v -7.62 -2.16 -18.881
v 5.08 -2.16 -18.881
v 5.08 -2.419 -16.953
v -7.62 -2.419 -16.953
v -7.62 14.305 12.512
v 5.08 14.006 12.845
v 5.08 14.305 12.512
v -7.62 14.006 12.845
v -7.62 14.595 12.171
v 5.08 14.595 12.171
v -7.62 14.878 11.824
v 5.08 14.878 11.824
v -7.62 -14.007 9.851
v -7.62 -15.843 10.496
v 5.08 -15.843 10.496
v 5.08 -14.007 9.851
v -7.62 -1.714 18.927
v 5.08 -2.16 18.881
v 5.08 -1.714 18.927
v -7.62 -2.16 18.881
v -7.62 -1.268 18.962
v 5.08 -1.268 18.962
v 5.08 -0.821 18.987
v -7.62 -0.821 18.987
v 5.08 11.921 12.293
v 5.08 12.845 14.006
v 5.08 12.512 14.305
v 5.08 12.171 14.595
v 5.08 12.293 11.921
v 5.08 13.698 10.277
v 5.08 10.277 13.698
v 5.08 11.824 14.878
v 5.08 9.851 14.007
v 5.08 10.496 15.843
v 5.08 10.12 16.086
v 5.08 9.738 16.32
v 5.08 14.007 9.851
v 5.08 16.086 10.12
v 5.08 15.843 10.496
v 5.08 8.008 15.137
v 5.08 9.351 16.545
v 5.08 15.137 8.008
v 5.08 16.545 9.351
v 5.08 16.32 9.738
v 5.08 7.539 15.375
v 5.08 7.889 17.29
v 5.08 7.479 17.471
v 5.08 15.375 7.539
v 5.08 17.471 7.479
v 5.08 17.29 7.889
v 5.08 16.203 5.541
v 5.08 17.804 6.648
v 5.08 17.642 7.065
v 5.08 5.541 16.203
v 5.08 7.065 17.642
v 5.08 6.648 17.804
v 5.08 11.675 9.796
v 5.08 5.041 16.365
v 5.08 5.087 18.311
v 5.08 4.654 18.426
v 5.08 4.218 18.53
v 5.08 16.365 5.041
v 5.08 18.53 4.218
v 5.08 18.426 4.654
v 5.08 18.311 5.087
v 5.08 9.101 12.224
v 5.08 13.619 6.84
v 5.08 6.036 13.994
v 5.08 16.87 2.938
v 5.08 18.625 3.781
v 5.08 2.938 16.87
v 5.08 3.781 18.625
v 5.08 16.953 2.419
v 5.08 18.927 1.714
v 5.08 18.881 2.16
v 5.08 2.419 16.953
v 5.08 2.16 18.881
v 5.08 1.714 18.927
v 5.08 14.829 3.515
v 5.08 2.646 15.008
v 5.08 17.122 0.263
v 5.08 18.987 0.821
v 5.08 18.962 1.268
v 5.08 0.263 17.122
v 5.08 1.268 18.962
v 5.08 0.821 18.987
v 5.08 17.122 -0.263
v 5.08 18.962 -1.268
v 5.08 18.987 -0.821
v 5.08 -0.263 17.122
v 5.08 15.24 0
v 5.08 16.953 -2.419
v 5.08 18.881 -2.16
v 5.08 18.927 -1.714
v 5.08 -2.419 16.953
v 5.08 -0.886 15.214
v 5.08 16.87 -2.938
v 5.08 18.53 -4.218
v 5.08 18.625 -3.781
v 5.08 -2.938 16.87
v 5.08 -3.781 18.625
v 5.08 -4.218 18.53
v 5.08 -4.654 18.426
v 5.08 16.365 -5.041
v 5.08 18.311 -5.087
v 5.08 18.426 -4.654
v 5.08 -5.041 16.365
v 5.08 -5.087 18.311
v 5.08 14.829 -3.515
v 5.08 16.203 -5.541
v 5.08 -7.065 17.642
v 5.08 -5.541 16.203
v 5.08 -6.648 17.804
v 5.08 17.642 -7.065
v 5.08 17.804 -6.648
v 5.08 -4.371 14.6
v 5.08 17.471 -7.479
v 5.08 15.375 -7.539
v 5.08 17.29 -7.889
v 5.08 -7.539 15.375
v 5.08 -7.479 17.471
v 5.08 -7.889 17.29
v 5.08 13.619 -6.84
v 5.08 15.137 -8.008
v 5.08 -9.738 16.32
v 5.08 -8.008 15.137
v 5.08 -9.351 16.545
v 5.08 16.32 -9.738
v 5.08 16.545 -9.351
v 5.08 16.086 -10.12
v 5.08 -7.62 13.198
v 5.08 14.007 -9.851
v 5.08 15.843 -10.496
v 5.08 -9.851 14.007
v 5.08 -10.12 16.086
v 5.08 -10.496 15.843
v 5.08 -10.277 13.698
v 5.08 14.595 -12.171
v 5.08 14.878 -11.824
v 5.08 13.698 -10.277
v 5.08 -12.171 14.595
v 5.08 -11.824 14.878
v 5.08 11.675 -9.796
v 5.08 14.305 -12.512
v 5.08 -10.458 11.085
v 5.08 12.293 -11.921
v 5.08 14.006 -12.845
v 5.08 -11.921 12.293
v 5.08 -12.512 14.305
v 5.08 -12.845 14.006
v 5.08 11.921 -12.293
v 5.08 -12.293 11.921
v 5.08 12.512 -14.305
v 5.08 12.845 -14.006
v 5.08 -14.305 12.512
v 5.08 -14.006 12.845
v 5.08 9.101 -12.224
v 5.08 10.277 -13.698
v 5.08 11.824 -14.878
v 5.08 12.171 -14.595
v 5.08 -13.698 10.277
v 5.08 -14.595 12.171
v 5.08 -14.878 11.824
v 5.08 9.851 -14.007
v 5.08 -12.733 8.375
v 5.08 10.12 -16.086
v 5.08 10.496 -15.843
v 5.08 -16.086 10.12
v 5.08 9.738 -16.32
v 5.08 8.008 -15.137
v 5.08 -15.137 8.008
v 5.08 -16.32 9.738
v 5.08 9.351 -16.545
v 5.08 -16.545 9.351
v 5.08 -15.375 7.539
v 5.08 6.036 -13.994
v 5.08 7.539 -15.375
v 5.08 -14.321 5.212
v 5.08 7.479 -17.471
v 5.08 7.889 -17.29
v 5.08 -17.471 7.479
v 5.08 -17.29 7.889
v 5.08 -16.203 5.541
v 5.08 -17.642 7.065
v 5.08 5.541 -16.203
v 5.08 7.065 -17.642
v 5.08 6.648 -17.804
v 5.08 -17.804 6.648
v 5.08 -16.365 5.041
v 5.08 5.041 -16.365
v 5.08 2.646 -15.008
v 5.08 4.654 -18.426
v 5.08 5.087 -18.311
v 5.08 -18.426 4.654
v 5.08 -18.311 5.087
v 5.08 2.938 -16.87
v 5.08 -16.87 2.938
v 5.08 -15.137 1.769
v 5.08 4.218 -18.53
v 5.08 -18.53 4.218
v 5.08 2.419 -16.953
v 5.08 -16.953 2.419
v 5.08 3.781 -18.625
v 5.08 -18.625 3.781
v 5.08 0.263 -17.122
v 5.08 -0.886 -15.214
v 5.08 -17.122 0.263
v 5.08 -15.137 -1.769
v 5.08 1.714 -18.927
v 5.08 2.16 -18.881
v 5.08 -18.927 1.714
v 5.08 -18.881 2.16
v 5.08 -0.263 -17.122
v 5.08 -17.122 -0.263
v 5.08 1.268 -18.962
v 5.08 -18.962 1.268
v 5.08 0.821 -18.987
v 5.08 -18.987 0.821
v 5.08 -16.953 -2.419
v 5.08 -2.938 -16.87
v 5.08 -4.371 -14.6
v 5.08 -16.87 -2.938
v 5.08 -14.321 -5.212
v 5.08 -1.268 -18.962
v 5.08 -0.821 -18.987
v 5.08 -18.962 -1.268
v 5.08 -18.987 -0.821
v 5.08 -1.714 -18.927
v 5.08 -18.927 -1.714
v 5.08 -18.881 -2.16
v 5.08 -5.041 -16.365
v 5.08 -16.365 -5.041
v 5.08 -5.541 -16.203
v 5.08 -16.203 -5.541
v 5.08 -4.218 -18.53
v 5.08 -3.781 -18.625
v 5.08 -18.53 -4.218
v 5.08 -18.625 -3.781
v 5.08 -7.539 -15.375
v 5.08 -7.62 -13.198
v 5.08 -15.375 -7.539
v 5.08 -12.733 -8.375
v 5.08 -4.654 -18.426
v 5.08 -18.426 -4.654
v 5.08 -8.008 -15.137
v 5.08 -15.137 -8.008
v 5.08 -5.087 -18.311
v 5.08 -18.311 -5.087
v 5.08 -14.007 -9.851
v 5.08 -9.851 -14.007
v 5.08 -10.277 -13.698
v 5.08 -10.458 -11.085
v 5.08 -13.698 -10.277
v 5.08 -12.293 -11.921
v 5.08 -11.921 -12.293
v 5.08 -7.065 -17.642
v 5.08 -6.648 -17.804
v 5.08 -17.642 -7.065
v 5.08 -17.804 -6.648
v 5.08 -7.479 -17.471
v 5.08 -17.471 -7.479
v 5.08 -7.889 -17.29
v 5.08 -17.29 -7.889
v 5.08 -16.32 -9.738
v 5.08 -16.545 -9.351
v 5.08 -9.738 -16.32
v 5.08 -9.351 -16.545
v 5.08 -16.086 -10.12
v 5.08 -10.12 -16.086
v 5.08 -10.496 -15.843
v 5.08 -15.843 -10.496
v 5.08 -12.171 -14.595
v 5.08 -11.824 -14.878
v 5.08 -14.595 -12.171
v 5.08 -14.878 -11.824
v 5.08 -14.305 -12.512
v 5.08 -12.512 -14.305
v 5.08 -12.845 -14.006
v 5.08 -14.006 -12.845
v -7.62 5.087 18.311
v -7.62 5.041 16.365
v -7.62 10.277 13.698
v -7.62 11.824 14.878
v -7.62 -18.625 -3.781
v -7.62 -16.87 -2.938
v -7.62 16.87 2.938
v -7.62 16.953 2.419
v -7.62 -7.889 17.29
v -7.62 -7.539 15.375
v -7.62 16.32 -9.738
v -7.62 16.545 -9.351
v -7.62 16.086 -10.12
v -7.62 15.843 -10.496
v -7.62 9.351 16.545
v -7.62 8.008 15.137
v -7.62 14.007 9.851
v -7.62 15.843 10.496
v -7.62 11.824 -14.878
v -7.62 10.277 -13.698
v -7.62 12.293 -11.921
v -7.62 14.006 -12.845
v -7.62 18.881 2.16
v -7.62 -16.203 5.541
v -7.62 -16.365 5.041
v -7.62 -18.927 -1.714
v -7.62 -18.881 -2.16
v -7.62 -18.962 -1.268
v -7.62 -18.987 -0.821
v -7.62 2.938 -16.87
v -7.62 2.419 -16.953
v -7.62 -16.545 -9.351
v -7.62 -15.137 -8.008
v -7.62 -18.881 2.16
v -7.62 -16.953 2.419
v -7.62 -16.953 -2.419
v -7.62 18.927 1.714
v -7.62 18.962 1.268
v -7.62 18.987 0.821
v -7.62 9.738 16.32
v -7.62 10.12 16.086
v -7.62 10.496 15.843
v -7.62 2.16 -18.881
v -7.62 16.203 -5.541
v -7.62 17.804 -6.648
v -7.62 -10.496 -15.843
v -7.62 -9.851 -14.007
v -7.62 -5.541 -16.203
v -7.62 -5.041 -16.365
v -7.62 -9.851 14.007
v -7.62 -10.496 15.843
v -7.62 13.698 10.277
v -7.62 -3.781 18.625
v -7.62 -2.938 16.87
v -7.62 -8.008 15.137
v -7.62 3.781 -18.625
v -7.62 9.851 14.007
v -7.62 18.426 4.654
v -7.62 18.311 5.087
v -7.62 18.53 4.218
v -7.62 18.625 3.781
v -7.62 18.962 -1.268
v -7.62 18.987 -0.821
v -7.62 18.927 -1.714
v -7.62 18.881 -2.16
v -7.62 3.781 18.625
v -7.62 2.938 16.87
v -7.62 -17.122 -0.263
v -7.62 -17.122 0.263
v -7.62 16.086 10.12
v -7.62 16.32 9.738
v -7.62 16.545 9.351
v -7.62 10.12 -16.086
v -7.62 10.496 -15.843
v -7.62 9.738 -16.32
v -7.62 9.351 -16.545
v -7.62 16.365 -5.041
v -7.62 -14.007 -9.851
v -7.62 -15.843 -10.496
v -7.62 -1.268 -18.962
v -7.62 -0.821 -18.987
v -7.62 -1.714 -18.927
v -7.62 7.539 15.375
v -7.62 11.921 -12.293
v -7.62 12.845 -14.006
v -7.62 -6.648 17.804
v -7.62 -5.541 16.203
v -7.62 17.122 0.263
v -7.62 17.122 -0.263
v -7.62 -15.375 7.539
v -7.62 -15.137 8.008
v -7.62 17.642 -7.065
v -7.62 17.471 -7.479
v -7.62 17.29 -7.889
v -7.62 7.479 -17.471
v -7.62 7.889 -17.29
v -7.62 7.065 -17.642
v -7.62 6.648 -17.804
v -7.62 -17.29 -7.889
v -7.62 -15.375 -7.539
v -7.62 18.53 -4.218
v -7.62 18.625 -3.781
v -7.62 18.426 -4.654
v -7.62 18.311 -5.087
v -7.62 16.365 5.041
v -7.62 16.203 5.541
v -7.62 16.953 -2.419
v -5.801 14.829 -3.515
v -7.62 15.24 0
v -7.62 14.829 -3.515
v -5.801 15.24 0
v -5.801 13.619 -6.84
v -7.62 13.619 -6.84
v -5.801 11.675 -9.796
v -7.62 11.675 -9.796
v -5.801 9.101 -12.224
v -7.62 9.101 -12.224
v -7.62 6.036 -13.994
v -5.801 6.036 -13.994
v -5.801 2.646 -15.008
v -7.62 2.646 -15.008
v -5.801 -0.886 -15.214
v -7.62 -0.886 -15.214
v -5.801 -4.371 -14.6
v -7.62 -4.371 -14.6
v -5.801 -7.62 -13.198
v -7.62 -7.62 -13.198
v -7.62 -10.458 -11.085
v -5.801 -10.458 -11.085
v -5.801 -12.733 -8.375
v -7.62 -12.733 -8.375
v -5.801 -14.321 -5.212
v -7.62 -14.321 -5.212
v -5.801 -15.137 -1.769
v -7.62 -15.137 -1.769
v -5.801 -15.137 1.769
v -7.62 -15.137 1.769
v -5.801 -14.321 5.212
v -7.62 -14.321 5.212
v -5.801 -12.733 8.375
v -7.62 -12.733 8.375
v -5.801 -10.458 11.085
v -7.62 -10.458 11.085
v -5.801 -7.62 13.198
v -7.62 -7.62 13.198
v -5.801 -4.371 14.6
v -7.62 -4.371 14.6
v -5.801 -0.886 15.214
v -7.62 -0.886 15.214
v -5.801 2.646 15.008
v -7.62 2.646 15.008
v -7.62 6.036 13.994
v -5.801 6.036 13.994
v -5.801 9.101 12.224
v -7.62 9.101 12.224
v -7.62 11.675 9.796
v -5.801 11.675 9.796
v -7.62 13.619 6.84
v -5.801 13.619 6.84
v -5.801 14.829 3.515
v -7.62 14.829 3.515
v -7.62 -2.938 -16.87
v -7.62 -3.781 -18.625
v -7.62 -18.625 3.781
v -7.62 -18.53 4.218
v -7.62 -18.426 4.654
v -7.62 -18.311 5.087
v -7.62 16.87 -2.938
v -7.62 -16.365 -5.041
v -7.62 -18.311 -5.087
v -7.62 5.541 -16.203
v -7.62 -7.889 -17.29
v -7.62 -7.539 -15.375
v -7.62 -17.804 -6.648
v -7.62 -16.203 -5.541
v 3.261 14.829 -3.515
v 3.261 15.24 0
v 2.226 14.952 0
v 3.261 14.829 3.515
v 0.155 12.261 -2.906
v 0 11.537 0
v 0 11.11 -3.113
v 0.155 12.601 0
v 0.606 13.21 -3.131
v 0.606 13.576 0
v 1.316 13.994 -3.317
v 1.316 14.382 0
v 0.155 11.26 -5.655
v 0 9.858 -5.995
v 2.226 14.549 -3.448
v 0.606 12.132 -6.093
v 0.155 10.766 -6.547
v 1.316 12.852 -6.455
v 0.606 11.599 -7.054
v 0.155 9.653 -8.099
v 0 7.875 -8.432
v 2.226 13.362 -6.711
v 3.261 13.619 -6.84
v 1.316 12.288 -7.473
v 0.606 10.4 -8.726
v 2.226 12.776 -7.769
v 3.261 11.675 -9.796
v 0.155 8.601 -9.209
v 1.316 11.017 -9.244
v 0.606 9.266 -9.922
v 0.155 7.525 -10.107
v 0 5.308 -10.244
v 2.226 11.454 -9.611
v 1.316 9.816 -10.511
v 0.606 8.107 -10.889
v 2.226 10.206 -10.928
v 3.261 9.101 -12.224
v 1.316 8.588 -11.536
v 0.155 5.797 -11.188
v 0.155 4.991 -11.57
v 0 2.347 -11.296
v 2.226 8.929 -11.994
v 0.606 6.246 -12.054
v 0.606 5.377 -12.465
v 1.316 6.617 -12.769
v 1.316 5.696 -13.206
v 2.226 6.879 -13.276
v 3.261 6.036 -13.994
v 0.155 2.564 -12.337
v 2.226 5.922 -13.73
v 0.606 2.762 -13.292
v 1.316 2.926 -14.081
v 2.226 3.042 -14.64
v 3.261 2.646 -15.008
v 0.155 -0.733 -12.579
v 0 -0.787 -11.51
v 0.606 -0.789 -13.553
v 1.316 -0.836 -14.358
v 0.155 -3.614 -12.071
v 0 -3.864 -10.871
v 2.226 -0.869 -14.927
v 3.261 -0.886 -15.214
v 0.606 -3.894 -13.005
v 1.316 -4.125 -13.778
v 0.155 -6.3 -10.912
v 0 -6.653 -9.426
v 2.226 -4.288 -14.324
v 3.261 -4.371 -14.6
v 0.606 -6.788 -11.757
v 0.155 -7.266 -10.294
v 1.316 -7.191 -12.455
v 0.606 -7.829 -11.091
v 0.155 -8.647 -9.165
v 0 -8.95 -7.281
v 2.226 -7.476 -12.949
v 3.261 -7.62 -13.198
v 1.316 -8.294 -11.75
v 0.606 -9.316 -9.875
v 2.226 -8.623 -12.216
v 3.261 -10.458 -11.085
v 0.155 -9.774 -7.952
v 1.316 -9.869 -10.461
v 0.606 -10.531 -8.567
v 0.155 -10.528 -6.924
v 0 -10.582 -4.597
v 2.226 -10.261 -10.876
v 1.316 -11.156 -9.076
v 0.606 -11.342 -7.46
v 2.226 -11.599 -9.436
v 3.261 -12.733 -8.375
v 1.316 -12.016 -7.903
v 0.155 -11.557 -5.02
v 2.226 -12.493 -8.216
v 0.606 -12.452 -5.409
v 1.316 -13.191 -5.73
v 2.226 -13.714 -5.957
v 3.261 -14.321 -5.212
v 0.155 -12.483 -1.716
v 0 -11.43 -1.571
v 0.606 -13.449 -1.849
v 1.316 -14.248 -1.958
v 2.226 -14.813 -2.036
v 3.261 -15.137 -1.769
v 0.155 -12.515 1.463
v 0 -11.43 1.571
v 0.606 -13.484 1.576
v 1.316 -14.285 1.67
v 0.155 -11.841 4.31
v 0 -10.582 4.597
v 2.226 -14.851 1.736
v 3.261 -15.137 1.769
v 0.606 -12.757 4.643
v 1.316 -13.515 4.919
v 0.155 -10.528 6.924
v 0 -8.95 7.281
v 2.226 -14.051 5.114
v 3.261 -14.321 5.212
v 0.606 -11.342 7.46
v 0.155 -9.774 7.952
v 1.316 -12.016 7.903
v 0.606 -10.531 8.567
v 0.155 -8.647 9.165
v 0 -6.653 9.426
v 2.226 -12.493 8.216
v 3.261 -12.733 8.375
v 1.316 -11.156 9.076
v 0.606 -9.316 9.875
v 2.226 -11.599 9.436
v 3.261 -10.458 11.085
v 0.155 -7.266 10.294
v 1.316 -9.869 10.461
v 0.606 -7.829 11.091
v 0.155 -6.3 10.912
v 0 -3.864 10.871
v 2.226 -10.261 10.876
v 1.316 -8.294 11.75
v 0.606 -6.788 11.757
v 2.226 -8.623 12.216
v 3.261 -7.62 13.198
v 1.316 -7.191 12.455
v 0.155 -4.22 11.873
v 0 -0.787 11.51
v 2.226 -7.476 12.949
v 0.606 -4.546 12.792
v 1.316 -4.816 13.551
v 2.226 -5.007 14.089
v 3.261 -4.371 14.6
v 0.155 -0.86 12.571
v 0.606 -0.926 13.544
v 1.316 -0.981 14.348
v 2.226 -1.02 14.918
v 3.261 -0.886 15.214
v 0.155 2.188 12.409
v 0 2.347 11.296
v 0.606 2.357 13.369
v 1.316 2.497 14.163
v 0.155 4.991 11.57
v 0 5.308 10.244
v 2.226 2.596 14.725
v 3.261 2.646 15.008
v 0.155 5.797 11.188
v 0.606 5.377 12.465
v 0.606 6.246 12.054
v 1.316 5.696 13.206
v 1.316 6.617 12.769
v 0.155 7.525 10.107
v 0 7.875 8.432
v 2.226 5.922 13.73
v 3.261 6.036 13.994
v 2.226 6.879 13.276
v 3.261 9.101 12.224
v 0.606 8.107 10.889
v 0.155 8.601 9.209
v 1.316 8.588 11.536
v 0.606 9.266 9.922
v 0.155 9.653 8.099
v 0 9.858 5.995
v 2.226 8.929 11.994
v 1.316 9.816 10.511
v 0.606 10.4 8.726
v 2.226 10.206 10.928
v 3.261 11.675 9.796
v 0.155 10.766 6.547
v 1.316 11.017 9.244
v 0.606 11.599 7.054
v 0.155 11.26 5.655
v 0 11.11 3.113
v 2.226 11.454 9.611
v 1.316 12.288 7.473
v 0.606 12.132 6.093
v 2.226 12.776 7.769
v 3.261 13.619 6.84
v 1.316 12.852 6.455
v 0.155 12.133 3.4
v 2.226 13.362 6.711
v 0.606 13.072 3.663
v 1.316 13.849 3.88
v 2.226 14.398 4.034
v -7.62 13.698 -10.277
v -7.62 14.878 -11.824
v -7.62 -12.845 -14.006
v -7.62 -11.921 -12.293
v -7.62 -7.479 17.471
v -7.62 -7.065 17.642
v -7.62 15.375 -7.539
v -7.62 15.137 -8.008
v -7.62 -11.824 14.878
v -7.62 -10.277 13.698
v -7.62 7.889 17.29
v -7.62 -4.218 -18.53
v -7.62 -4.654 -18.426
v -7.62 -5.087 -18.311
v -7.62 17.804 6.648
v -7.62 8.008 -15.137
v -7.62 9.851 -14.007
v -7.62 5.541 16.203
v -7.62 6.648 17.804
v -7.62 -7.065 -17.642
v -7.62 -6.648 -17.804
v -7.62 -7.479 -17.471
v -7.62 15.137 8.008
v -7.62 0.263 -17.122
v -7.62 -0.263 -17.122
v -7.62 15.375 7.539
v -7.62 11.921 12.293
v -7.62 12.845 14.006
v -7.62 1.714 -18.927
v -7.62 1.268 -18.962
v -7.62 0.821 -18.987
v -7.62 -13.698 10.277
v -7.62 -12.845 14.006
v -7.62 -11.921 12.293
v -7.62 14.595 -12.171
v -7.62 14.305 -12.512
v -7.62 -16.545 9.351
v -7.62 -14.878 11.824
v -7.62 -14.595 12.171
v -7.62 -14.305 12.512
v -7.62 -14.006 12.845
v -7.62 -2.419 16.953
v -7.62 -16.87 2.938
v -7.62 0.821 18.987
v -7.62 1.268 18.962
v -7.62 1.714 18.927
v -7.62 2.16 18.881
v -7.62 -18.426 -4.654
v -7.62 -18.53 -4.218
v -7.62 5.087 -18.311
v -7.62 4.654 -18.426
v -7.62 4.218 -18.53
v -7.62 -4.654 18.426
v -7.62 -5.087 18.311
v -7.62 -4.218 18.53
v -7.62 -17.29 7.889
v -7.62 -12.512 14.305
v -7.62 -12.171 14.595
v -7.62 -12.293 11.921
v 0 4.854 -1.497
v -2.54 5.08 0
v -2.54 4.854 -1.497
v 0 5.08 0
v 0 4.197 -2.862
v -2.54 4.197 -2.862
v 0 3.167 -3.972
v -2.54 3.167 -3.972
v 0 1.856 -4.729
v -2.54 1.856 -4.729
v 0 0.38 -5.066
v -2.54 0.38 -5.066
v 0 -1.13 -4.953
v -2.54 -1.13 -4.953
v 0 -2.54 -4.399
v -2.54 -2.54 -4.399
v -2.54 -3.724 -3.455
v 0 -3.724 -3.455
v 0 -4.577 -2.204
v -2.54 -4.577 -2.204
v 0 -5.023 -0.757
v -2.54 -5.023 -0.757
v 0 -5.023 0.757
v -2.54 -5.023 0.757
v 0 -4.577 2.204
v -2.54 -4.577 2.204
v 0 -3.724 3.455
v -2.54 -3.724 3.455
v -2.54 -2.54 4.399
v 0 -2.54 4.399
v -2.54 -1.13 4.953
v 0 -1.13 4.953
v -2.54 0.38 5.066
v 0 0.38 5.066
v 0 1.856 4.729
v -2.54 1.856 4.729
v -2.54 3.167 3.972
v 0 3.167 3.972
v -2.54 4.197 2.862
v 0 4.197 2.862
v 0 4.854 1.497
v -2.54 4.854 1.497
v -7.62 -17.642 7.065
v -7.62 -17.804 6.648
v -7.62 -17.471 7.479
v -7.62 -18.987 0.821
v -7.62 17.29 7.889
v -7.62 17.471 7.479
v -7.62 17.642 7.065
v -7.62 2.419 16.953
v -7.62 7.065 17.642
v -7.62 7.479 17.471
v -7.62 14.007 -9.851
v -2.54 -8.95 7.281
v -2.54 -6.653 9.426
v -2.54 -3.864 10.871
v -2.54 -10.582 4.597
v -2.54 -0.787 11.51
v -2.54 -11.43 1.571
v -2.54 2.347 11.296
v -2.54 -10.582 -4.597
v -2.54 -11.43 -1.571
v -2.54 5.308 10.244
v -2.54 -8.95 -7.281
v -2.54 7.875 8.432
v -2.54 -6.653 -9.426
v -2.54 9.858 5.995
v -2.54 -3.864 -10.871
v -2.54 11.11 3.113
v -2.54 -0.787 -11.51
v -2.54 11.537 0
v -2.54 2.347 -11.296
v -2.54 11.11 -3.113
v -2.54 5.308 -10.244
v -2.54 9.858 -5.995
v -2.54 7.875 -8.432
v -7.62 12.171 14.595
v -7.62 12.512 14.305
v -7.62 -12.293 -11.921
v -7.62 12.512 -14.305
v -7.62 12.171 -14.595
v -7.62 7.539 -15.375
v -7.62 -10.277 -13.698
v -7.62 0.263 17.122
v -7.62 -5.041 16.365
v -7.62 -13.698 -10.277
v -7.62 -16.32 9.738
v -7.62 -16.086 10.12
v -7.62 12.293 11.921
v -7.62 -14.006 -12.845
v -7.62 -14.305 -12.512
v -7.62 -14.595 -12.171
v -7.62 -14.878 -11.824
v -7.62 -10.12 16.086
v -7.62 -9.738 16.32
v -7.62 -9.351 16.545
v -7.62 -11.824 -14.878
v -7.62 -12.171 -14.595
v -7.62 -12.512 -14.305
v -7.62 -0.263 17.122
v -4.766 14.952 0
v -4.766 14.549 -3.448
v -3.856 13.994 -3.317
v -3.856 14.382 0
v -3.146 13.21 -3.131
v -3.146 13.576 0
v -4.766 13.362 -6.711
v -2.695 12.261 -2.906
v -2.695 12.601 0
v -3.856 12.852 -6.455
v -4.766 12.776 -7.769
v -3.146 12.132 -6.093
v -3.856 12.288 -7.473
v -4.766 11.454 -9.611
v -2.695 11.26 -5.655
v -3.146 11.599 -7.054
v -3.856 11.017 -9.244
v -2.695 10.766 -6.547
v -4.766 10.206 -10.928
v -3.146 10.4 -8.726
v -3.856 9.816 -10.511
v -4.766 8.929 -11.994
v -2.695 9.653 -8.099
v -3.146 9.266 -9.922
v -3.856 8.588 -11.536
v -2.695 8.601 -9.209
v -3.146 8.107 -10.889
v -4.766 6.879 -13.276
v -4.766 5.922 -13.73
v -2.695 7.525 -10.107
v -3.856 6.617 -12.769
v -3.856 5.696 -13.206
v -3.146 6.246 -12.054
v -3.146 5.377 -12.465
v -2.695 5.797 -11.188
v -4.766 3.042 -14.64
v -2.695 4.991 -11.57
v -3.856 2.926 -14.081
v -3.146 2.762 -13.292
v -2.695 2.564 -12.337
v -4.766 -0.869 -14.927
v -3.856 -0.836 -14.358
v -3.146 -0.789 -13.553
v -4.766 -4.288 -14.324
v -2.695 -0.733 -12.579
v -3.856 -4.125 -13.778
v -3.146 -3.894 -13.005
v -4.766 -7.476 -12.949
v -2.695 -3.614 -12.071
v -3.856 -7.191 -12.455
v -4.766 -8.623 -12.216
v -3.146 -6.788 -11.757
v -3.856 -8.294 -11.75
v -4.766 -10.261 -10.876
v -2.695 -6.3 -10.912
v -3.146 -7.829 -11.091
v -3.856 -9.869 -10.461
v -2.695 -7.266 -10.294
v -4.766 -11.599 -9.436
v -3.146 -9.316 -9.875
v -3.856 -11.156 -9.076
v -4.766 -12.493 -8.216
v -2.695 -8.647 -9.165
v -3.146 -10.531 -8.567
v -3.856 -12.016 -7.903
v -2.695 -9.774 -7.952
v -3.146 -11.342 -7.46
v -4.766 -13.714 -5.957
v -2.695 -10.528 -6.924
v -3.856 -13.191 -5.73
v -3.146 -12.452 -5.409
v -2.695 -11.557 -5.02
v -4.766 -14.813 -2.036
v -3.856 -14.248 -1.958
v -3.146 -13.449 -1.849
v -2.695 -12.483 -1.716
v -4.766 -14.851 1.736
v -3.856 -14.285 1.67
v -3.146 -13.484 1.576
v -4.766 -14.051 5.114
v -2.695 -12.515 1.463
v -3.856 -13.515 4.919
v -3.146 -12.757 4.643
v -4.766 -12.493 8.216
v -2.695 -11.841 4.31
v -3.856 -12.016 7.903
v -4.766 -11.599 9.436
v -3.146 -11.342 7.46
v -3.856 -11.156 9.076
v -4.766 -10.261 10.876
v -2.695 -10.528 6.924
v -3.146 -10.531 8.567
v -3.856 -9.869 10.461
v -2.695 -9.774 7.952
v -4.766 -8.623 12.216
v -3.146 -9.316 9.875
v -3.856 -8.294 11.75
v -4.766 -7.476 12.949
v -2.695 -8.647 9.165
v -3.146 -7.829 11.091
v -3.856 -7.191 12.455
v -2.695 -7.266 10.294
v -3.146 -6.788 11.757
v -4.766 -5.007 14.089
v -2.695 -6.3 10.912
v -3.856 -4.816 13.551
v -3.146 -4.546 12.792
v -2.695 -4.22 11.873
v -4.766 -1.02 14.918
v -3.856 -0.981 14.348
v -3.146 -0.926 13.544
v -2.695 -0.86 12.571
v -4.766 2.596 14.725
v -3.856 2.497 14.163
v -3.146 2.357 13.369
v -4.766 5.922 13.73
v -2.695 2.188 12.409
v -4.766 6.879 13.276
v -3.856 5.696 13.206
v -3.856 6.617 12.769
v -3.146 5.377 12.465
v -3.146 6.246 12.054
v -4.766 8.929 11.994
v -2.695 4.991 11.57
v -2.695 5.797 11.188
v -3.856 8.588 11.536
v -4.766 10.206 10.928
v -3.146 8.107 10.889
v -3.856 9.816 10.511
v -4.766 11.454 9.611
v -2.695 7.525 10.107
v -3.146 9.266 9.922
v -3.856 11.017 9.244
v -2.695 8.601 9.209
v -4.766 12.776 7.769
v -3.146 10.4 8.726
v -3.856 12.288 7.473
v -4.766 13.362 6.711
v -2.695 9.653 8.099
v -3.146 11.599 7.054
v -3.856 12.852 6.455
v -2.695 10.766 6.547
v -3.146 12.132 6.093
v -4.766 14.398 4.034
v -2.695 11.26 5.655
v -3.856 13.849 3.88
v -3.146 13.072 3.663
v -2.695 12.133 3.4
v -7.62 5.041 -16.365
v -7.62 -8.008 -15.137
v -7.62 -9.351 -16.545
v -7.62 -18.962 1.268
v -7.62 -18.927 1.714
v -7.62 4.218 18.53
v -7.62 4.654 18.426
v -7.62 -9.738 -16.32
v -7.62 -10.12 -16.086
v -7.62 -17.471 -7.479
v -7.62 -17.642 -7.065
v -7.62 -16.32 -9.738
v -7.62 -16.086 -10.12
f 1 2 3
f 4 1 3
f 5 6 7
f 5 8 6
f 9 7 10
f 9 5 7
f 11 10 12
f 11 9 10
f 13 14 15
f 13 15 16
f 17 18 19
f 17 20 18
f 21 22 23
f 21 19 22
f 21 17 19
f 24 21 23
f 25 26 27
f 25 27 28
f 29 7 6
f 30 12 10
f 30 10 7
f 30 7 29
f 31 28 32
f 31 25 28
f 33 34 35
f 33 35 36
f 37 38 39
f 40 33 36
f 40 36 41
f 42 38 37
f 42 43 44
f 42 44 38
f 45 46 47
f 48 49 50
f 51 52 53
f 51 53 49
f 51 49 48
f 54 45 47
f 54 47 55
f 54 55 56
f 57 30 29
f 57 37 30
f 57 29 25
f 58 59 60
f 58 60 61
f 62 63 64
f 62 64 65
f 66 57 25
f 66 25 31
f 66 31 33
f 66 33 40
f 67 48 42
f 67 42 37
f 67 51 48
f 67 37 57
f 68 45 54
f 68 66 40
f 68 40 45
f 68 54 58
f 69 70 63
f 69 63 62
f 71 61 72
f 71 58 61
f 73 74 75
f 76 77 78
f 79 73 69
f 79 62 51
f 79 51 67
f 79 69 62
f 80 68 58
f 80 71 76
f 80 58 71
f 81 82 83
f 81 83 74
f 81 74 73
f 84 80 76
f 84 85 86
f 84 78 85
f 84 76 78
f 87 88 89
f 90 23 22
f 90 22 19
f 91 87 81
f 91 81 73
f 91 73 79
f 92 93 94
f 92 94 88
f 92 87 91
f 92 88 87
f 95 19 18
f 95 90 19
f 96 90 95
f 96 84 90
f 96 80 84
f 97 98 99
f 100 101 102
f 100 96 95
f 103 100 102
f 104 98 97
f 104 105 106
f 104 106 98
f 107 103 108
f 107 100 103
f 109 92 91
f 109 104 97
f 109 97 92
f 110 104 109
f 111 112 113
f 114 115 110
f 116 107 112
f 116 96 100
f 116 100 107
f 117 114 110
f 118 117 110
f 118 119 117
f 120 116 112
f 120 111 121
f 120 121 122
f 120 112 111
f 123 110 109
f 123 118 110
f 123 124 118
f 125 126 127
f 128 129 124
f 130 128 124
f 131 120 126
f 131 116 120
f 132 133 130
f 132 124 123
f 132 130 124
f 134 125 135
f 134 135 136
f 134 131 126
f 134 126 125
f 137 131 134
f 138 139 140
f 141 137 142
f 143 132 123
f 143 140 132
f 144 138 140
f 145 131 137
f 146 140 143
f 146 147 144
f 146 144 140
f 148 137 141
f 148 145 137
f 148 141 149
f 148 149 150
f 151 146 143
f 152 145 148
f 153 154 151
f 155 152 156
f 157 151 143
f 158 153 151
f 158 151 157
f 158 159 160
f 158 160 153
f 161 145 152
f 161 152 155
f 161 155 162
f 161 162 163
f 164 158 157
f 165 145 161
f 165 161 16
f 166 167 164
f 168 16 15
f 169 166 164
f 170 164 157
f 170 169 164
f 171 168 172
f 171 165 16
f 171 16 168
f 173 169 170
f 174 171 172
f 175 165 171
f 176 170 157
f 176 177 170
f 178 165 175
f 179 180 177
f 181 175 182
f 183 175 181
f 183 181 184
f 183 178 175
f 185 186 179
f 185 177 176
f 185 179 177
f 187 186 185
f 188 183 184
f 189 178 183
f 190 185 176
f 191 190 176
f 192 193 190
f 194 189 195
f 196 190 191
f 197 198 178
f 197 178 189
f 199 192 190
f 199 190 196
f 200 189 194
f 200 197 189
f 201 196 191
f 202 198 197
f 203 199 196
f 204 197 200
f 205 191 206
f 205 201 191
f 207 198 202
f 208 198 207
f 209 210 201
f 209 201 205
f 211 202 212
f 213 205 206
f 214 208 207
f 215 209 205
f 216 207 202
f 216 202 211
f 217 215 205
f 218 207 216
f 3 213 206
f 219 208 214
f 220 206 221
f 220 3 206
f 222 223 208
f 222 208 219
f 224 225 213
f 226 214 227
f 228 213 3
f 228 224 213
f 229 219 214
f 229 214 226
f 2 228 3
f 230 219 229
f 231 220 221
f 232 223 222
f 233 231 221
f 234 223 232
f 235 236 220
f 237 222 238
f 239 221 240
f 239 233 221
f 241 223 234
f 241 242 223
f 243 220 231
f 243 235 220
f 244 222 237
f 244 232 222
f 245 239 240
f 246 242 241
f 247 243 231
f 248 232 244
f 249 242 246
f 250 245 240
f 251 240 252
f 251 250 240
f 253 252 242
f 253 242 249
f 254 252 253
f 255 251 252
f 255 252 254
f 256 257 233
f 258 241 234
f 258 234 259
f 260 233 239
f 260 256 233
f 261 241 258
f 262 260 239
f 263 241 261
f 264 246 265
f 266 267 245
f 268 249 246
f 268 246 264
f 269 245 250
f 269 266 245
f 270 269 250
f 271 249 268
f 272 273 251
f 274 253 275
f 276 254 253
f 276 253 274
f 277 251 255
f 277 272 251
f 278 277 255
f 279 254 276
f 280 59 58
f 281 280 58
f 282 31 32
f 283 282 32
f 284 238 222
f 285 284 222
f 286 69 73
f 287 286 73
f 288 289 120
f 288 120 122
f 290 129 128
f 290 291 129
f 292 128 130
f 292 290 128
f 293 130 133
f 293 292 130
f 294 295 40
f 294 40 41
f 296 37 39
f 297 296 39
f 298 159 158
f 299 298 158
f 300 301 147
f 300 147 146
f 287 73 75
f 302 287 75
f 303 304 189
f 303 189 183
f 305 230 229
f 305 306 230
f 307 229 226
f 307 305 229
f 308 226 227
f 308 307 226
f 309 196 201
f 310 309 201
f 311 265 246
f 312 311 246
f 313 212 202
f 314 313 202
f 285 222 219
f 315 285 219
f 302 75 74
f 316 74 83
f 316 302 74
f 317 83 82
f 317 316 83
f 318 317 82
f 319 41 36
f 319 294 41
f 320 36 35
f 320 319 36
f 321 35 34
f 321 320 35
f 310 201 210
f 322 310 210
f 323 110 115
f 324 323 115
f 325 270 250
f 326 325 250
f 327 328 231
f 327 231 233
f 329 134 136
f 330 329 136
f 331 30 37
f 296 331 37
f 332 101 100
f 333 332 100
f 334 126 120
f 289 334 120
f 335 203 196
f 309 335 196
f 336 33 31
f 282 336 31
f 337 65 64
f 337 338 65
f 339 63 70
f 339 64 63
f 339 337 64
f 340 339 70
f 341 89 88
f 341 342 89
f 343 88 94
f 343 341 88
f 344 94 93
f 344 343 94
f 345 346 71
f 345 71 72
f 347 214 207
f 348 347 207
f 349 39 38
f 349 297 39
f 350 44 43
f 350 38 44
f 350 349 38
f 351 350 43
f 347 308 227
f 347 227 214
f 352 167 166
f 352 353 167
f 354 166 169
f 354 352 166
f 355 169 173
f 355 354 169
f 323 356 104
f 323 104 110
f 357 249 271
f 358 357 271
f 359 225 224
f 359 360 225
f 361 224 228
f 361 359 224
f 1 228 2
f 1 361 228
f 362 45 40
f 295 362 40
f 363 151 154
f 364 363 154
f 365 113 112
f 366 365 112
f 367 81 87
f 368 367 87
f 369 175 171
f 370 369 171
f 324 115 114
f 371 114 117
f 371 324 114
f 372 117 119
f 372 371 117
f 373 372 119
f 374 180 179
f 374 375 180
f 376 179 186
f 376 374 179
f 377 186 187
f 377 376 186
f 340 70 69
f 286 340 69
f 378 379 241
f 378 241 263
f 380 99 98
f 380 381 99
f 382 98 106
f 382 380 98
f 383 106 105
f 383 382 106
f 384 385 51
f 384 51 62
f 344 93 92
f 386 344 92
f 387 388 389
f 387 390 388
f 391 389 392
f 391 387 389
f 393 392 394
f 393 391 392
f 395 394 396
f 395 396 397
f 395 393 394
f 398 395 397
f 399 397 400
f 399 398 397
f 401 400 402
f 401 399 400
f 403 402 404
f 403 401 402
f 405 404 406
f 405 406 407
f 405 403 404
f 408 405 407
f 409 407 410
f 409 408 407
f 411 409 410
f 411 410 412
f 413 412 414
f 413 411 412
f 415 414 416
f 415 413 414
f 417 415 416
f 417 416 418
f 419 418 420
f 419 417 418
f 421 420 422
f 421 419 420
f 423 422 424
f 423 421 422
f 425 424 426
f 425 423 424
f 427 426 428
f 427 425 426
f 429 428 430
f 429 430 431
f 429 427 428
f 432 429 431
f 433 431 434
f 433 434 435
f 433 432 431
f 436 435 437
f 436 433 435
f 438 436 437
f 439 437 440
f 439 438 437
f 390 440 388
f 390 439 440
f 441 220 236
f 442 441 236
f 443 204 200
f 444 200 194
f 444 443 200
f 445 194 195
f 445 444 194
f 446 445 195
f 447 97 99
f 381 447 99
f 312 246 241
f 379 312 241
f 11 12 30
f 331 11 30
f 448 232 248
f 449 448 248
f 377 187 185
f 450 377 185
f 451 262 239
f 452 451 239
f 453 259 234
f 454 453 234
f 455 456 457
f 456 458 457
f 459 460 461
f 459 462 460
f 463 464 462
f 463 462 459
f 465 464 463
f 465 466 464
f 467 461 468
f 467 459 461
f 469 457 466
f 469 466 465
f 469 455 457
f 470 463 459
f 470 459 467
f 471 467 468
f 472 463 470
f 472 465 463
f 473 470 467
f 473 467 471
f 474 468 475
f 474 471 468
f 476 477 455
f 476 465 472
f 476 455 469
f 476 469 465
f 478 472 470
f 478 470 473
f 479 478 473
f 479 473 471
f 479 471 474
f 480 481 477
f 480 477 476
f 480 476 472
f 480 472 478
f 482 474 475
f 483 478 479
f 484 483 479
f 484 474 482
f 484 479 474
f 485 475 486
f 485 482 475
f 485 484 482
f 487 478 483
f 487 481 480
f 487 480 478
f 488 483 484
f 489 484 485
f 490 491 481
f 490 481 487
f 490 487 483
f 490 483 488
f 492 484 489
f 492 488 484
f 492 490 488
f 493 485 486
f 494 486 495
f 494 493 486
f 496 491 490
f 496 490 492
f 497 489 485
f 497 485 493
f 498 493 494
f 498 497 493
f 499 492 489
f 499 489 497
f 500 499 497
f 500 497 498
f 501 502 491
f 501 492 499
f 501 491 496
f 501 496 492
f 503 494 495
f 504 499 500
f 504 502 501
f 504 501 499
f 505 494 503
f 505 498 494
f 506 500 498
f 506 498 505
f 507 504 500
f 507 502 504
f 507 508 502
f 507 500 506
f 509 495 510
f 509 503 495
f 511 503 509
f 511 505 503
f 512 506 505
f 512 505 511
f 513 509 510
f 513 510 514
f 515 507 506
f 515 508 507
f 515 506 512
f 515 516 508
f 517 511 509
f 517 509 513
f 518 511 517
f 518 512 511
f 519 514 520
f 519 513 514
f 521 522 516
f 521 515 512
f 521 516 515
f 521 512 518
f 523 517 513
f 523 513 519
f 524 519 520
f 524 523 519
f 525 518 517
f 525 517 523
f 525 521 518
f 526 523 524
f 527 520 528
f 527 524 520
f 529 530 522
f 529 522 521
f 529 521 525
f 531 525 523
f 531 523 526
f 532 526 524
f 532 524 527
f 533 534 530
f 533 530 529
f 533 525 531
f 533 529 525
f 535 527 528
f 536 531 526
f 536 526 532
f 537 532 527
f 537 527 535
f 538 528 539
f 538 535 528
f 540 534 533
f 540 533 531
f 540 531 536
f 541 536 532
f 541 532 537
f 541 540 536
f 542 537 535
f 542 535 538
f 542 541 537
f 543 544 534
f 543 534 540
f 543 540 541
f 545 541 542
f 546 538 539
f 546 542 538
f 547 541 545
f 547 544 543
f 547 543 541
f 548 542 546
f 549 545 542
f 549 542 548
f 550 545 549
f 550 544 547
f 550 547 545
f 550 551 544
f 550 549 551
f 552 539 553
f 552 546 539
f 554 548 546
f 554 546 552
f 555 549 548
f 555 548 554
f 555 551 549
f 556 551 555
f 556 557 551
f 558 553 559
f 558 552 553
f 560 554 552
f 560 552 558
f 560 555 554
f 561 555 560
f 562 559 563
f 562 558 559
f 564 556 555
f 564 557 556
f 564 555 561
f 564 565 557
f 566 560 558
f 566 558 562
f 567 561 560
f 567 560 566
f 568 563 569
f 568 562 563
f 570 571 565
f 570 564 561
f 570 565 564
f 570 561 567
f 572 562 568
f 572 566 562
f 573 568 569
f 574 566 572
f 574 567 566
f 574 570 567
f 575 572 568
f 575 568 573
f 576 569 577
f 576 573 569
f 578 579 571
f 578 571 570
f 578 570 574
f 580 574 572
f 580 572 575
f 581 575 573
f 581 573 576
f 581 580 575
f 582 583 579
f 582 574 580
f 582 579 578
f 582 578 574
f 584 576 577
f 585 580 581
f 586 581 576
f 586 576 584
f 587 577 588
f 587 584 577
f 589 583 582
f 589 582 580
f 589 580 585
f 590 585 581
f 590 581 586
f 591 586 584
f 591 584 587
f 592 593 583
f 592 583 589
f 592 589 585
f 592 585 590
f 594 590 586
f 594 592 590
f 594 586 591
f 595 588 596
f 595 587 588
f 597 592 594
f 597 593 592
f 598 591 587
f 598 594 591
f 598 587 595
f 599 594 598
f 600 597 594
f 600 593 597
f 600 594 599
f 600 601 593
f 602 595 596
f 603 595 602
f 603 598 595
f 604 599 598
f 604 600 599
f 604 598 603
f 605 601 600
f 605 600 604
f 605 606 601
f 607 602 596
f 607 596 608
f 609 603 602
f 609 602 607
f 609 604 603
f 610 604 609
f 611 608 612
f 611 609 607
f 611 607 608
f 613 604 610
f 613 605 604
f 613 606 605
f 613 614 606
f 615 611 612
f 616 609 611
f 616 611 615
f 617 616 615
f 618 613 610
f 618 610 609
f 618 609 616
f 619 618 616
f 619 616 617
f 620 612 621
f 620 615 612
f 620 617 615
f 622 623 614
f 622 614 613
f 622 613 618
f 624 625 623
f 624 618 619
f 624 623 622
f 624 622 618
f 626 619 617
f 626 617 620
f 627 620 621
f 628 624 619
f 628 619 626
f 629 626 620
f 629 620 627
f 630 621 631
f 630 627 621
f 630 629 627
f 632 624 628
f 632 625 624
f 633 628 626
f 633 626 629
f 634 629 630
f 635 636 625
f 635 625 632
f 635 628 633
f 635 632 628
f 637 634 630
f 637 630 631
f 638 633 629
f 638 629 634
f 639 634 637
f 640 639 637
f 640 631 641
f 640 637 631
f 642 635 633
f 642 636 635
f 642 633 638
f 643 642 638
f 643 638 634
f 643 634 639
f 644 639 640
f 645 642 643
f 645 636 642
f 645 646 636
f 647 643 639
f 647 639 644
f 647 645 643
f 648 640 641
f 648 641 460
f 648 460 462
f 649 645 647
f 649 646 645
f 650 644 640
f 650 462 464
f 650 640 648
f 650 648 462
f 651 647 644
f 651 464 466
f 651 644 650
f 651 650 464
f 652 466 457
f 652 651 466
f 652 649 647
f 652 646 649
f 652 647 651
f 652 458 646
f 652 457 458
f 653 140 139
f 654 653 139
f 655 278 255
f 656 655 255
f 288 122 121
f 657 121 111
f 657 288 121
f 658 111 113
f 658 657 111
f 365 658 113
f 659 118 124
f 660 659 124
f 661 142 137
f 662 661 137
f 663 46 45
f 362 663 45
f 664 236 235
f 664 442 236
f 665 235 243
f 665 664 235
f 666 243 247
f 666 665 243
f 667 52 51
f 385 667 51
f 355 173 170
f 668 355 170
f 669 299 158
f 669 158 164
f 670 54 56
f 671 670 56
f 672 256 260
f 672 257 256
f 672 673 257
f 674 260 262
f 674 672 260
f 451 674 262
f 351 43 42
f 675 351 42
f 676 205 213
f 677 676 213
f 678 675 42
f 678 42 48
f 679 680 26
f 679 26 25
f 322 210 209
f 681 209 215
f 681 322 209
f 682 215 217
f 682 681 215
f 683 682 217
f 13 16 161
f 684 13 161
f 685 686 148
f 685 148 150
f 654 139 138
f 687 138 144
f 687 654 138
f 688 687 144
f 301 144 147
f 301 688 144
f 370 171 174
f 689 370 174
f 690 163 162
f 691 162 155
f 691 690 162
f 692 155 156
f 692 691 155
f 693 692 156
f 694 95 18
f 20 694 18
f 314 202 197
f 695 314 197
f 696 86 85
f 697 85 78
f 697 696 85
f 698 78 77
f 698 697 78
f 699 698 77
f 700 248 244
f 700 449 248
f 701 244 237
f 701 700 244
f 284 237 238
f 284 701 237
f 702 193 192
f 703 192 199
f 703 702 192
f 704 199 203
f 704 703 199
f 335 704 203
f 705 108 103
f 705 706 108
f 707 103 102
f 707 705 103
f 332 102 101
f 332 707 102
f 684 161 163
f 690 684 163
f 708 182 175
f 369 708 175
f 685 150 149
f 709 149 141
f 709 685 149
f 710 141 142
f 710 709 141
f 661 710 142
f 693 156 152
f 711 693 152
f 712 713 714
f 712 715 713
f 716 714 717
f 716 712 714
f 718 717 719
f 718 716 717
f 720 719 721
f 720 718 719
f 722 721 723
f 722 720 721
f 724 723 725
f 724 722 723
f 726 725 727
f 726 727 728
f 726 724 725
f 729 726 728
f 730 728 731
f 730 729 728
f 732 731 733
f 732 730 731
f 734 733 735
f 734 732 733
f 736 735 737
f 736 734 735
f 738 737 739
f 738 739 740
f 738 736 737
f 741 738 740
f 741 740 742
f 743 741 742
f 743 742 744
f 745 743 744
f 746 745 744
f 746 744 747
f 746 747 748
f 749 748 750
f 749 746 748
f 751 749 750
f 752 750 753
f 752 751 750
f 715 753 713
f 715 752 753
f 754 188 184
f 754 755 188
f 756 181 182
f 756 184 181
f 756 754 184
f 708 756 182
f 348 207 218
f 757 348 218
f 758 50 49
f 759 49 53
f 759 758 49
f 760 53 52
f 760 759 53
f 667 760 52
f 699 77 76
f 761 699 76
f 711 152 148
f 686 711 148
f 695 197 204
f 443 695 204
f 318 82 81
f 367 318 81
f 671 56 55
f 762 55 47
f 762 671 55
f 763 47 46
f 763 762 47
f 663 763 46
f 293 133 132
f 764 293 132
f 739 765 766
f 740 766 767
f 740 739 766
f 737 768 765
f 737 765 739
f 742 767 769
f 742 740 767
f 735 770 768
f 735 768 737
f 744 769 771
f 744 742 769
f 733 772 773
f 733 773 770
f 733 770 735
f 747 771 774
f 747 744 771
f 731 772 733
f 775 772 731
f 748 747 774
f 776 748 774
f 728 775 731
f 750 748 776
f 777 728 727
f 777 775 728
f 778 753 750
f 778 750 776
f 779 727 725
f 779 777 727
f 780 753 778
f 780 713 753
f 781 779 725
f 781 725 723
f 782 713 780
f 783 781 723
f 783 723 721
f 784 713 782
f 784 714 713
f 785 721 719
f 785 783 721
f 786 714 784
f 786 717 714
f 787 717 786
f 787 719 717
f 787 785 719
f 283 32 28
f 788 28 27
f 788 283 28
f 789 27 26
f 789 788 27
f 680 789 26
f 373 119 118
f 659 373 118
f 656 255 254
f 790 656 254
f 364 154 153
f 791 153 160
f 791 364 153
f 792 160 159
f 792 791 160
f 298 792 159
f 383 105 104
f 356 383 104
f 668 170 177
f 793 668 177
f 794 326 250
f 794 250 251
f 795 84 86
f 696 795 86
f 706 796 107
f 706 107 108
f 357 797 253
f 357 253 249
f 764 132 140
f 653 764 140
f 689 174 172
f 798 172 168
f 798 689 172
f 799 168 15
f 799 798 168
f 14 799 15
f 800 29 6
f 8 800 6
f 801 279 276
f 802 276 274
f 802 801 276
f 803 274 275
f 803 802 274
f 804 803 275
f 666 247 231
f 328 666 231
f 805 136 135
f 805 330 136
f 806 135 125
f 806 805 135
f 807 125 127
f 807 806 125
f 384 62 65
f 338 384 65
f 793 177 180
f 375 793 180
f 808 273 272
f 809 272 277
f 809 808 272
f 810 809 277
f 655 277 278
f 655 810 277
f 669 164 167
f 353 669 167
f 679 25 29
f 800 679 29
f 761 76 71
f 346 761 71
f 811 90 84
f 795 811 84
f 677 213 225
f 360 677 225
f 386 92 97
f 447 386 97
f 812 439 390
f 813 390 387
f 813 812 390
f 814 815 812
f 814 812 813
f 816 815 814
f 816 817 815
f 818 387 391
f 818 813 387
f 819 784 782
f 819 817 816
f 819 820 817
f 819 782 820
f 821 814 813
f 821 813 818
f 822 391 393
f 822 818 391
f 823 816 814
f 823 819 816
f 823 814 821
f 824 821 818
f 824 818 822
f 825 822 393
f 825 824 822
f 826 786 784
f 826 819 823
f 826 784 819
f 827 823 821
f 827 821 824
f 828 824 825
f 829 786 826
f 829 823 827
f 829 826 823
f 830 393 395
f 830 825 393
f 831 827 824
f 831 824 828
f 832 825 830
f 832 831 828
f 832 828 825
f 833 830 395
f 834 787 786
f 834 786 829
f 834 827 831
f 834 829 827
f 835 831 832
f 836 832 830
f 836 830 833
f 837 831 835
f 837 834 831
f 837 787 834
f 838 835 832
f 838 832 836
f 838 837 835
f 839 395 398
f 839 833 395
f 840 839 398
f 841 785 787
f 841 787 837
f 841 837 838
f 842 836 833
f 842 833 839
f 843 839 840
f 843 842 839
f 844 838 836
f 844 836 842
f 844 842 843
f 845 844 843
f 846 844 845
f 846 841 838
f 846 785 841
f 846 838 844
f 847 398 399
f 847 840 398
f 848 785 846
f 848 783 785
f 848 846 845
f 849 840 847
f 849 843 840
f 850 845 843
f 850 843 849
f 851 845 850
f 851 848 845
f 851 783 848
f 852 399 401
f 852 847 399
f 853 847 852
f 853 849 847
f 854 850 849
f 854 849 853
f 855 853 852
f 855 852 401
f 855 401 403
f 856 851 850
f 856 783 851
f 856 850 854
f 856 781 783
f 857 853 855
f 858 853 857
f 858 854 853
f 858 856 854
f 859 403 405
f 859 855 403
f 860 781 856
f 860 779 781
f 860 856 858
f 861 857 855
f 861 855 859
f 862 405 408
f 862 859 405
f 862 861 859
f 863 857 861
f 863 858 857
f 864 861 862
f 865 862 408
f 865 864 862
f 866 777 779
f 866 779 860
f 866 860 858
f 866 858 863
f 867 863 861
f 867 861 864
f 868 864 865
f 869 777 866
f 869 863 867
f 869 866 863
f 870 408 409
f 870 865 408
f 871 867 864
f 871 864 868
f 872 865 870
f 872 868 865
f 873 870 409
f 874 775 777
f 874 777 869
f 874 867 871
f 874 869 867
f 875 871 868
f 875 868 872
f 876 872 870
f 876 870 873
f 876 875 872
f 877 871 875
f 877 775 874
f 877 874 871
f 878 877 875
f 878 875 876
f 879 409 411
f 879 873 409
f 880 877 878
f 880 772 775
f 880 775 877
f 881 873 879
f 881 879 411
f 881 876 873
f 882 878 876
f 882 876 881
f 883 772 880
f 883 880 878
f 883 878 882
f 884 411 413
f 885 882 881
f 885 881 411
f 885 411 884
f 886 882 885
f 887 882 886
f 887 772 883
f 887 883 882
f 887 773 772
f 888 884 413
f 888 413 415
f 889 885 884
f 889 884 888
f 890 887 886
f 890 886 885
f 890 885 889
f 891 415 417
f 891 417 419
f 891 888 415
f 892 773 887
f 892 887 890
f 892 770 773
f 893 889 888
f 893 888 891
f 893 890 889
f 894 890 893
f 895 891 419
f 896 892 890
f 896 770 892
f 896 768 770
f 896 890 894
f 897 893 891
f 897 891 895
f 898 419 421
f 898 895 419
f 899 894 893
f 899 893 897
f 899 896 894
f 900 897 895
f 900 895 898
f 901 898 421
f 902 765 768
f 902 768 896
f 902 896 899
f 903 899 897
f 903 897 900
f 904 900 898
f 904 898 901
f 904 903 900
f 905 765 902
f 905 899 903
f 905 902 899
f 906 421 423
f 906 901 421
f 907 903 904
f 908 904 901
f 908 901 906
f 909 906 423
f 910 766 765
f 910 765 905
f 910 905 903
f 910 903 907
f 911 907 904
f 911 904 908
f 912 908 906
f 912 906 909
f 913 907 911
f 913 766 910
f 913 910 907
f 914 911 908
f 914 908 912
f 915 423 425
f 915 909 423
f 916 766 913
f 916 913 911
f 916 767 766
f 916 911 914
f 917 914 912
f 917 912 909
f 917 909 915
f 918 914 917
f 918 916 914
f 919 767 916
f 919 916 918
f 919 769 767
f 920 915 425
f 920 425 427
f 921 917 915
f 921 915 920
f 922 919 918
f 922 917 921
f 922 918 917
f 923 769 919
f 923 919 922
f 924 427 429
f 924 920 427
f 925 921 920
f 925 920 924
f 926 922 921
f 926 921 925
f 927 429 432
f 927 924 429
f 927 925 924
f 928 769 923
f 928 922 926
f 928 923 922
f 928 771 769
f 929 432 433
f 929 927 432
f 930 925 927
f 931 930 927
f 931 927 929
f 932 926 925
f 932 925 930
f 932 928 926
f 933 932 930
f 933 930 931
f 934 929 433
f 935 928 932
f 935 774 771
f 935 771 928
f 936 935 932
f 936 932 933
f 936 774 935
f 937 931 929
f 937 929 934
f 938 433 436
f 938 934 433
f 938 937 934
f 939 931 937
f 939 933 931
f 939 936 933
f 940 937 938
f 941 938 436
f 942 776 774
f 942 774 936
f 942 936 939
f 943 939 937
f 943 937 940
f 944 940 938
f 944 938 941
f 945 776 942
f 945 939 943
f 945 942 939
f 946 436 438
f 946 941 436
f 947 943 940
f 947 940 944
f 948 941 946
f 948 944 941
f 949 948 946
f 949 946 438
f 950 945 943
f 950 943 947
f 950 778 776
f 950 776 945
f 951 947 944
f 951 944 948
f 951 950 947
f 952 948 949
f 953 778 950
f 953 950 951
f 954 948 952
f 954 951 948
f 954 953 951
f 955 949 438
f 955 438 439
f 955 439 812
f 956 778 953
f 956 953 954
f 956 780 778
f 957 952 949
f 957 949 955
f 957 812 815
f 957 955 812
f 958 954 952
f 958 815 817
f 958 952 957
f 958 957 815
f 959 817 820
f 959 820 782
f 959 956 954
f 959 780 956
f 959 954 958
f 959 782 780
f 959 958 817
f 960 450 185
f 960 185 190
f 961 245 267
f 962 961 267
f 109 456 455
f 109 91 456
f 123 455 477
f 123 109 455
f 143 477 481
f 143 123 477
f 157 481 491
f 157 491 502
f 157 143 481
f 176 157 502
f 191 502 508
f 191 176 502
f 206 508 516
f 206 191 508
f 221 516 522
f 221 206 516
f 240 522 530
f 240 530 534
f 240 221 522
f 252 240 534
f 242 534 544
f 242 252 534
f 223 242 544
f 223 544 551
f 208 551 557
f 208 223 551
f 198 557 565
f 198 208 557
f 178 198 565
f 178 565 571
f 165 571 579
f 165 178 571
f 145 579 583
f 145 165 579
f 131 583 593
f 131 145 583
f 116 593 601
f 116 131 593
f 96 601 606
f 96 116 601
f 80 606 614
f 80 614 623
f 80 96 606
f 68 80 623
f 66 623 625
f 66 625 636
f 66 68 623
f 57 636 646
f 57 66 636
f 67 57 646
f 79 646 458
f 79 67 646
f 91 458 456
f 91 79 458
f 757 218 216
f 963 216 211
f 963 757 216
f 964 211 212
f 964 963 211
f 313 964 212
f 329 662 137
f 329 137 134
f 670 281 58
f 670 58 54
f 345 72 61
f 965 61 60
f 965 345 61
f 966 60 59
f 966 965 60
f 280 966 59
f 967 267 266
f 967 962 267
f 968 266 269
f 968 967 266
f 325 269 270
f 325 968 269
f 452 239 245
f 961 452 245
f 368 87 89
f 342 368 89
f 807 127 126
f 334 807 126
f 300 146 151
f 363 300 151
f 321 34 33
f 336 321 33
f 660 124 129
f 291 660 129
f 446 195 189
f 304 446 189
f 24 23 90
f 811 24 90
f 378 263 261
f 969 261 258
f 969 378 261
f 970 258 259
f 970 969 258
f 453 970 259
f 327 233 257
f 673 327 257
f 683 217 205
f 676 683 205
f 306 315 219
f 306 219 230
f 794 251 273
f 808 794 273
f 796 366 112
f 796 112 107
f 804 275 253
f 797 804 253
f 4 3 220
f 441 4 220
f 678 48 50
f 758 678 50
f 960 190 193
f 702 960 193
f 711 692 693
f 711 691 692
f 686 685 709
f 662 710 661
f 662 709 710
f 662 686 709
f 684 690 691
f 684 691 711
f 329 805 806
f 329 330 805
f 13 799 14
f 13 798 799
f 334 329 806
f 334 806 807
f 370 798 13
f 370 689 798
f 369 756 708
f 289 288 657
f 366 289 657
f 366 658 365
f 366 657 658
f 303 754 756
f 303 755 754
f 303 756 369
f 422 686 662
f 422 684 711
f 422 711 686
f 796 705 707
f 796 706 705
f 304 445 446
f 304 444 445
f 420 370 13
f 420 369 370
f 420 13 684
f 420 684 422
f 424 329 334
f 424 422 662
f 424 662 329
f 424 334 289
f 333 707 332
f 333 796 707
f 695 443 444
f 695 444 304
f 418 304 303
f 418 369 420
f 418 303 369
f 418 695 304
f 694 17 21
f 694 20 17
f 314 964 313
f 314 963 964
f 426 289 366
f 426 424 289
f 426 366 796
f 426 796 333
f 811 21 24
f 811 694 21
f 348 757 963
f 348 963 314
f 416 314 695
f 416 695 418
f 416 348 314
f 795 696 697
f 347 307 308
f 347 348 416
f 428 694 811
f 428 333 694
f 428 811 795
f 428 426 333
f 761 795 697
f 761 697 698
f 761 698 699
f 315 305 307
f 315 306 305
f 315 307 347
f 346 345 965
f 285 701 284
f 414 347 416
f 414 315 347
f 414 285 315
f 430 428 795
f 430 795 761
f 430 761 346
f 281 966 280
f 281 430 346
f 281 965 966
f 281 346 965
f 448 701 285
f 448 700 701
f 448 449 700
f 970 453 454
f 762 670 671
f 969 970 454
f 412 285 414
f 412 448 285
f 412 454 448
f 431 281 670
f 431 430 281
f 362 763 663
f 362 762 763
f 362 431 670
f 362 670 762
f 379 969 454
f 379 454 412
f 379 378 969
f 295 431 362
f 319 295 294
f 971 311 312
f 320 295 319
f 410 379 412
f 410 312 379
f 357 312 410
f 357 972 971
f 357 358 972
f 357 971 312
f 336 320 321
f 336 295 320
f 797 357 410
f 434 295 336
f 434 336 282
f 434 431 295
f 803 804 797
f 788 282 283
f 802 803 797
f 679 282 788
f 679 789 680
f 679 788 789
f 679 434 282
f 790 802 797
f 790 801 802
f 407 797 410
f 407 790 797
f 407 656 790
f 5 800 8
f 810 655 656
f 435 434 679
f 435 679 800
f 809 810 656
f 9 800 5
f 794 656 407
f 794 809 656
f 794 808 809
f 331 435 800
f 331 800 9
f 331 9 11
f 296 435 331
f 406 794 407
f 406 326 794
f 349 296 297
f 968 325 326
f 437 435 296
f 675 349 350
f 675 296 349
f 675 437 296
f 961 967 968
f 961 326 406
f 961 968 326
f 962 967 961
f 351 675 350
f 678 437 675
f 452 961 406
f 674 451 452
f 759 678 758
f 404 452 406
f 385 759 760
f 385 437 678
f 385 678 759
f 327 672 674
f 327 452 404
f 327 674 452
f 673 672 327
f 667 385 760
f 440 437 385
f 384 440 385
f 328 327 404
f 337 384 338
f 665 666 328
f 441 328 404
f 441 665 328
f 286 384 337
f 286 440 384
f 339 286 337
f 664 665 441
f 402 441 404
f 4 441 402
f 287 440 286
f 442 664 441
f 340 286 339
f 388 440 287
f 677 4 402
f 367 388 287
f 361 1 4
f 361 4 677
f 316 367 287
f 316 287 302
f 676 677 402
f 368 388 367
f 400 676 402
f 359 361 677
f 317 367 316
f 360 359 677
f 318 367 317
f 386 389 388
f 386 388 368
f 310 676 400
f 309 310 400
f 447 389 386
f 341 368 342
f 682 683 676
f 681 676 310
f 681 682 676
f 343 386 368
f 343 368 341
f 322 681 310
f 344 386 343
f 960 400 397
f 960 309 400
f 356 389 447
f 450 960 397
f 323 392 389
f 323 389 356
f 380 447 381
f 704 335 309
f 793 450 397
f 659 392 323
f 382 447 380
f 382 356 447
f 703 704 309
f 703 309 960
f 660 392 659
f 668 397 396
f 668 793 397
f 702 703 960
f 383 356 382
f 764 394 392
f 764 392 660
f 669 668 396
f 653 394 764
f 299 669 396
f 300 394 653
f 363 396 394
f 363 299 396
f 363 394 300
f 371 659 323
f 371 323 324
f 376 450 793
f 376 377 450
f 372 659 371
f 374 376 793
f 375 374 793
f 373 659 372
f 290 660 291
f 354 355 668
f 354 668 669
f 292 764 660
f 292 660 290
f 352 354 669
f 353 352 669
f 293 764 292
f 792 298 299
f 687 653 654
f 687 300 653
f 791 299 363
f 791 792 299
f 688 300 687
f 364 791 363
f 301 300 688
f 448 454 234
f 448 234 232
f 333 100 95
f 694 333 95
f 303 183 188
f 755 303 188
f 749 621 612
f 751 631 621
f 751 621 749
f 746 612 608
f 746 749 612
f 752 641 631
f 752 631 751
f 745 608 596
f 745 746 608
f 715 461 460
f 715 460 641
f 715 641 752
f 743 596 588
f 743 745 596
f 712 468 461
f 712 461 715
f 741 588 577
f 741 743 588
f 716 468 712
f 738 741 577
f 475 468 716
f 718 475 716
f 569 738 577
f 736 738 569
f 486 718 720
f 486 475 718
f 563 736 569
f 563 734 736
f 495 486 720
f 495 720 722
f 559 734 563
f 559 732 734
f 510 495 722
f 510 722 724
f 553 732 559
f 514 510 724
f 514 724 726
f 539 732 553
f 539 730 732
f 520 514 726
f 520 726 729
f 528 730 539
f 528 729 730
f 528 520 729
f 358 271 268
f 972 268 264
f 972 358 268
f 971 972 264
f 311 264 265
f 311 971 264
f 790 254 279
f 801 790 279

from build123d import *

# Parameters (mm, degrees)
F3_DEPTH = 25.4
F4_COUNT = 40


with BuildPart() as f1:
    # F0 (on Top) → F1 (revolve)
    with BuildSketch(Plane.XY):
        Polygon((-2.54, 15.24), (0, 15.24), (3.2612350769, 15.24), (5.08, 15.24), (5.08, 19.0043579787), (-7.62, 19.0043579787), (-7.62, 15.24), (-5.8012350769, 15.24), align=None)
        with BuildLine():
            ThreePointArc((-5.8012350769, 15.24), (-3.4715579779, 14.0044093291), (-2.54, 11.5373707349))
            Line((-2.54, 11.5373707349), (-2.54, 15.24))
            Line((-2.54, 15.24), (-5.8012350769, 15.24))
        make_face()
        Polygon((-2.54, 5.08), (0, 5.08), (0, 11.5373707349), (0, 15.24), (-2.54, 15.24), (-2.54, 11.5373707349), align=None)
        with BuildLine():
            Line((0, 15.24), (0, 11.5373707349))
            ThreePointArc((0, 11.5373707349), (0.9315579779, 14.0044093291), (3.2612350769, 15.24))
            Line((3.2612350769, 15.24), (0, 15.24))
        make_face()
    revolve(axis=Axis((-6.35, 0, 0), (-1, 0, 0)))

    # F2 (on face) → F3 (cut)
    with BuildSketch(Plane.YZ.offset(5.08)):
        with BuildLine():
            Line((0, 17.1221789894), (0, 19.0043579787))
            ThreePointArc((0, 19.0043579787), (-0.4103514296, 18.9999272074), (-0.8205115163, 18.9866369596))
            Line((-0.8205115163, 18.9866369596), (-0.2629475493, 17.1221789894))
            Line((-0.2629475493, 17.1221789894), (0, 17.1221789894))
        make_face()
        with BuildLine():
            ThreePointArc((0.8205115163, 18.9866369596), (0.4103514296, 18.9999272074), (0, 19.0043579787))
            Line((0, 19.0043579787), (0, 17.1221789894))
            Line((0, 17.1221789894), (0.2629475493, 17.1221789894))
            Line((0.2629475493, 17.1221789894), (0.8205115163, 18.9866369596))
        make_face()
    f3 = extrude(amount=-F3_DEPTH, mode=Mode.SUBTRACT)

    # F4: F3 ×40 about axis
    f4_axis = Axis((0, 0, 0), (-1, 0, 0))
    for i in range(1, F4_COUNT):
        add(f3.rotate(f4_axis, i * 360 / F4_COUNT), mode=Mode.SUBTRACT)


solid = f1.part
